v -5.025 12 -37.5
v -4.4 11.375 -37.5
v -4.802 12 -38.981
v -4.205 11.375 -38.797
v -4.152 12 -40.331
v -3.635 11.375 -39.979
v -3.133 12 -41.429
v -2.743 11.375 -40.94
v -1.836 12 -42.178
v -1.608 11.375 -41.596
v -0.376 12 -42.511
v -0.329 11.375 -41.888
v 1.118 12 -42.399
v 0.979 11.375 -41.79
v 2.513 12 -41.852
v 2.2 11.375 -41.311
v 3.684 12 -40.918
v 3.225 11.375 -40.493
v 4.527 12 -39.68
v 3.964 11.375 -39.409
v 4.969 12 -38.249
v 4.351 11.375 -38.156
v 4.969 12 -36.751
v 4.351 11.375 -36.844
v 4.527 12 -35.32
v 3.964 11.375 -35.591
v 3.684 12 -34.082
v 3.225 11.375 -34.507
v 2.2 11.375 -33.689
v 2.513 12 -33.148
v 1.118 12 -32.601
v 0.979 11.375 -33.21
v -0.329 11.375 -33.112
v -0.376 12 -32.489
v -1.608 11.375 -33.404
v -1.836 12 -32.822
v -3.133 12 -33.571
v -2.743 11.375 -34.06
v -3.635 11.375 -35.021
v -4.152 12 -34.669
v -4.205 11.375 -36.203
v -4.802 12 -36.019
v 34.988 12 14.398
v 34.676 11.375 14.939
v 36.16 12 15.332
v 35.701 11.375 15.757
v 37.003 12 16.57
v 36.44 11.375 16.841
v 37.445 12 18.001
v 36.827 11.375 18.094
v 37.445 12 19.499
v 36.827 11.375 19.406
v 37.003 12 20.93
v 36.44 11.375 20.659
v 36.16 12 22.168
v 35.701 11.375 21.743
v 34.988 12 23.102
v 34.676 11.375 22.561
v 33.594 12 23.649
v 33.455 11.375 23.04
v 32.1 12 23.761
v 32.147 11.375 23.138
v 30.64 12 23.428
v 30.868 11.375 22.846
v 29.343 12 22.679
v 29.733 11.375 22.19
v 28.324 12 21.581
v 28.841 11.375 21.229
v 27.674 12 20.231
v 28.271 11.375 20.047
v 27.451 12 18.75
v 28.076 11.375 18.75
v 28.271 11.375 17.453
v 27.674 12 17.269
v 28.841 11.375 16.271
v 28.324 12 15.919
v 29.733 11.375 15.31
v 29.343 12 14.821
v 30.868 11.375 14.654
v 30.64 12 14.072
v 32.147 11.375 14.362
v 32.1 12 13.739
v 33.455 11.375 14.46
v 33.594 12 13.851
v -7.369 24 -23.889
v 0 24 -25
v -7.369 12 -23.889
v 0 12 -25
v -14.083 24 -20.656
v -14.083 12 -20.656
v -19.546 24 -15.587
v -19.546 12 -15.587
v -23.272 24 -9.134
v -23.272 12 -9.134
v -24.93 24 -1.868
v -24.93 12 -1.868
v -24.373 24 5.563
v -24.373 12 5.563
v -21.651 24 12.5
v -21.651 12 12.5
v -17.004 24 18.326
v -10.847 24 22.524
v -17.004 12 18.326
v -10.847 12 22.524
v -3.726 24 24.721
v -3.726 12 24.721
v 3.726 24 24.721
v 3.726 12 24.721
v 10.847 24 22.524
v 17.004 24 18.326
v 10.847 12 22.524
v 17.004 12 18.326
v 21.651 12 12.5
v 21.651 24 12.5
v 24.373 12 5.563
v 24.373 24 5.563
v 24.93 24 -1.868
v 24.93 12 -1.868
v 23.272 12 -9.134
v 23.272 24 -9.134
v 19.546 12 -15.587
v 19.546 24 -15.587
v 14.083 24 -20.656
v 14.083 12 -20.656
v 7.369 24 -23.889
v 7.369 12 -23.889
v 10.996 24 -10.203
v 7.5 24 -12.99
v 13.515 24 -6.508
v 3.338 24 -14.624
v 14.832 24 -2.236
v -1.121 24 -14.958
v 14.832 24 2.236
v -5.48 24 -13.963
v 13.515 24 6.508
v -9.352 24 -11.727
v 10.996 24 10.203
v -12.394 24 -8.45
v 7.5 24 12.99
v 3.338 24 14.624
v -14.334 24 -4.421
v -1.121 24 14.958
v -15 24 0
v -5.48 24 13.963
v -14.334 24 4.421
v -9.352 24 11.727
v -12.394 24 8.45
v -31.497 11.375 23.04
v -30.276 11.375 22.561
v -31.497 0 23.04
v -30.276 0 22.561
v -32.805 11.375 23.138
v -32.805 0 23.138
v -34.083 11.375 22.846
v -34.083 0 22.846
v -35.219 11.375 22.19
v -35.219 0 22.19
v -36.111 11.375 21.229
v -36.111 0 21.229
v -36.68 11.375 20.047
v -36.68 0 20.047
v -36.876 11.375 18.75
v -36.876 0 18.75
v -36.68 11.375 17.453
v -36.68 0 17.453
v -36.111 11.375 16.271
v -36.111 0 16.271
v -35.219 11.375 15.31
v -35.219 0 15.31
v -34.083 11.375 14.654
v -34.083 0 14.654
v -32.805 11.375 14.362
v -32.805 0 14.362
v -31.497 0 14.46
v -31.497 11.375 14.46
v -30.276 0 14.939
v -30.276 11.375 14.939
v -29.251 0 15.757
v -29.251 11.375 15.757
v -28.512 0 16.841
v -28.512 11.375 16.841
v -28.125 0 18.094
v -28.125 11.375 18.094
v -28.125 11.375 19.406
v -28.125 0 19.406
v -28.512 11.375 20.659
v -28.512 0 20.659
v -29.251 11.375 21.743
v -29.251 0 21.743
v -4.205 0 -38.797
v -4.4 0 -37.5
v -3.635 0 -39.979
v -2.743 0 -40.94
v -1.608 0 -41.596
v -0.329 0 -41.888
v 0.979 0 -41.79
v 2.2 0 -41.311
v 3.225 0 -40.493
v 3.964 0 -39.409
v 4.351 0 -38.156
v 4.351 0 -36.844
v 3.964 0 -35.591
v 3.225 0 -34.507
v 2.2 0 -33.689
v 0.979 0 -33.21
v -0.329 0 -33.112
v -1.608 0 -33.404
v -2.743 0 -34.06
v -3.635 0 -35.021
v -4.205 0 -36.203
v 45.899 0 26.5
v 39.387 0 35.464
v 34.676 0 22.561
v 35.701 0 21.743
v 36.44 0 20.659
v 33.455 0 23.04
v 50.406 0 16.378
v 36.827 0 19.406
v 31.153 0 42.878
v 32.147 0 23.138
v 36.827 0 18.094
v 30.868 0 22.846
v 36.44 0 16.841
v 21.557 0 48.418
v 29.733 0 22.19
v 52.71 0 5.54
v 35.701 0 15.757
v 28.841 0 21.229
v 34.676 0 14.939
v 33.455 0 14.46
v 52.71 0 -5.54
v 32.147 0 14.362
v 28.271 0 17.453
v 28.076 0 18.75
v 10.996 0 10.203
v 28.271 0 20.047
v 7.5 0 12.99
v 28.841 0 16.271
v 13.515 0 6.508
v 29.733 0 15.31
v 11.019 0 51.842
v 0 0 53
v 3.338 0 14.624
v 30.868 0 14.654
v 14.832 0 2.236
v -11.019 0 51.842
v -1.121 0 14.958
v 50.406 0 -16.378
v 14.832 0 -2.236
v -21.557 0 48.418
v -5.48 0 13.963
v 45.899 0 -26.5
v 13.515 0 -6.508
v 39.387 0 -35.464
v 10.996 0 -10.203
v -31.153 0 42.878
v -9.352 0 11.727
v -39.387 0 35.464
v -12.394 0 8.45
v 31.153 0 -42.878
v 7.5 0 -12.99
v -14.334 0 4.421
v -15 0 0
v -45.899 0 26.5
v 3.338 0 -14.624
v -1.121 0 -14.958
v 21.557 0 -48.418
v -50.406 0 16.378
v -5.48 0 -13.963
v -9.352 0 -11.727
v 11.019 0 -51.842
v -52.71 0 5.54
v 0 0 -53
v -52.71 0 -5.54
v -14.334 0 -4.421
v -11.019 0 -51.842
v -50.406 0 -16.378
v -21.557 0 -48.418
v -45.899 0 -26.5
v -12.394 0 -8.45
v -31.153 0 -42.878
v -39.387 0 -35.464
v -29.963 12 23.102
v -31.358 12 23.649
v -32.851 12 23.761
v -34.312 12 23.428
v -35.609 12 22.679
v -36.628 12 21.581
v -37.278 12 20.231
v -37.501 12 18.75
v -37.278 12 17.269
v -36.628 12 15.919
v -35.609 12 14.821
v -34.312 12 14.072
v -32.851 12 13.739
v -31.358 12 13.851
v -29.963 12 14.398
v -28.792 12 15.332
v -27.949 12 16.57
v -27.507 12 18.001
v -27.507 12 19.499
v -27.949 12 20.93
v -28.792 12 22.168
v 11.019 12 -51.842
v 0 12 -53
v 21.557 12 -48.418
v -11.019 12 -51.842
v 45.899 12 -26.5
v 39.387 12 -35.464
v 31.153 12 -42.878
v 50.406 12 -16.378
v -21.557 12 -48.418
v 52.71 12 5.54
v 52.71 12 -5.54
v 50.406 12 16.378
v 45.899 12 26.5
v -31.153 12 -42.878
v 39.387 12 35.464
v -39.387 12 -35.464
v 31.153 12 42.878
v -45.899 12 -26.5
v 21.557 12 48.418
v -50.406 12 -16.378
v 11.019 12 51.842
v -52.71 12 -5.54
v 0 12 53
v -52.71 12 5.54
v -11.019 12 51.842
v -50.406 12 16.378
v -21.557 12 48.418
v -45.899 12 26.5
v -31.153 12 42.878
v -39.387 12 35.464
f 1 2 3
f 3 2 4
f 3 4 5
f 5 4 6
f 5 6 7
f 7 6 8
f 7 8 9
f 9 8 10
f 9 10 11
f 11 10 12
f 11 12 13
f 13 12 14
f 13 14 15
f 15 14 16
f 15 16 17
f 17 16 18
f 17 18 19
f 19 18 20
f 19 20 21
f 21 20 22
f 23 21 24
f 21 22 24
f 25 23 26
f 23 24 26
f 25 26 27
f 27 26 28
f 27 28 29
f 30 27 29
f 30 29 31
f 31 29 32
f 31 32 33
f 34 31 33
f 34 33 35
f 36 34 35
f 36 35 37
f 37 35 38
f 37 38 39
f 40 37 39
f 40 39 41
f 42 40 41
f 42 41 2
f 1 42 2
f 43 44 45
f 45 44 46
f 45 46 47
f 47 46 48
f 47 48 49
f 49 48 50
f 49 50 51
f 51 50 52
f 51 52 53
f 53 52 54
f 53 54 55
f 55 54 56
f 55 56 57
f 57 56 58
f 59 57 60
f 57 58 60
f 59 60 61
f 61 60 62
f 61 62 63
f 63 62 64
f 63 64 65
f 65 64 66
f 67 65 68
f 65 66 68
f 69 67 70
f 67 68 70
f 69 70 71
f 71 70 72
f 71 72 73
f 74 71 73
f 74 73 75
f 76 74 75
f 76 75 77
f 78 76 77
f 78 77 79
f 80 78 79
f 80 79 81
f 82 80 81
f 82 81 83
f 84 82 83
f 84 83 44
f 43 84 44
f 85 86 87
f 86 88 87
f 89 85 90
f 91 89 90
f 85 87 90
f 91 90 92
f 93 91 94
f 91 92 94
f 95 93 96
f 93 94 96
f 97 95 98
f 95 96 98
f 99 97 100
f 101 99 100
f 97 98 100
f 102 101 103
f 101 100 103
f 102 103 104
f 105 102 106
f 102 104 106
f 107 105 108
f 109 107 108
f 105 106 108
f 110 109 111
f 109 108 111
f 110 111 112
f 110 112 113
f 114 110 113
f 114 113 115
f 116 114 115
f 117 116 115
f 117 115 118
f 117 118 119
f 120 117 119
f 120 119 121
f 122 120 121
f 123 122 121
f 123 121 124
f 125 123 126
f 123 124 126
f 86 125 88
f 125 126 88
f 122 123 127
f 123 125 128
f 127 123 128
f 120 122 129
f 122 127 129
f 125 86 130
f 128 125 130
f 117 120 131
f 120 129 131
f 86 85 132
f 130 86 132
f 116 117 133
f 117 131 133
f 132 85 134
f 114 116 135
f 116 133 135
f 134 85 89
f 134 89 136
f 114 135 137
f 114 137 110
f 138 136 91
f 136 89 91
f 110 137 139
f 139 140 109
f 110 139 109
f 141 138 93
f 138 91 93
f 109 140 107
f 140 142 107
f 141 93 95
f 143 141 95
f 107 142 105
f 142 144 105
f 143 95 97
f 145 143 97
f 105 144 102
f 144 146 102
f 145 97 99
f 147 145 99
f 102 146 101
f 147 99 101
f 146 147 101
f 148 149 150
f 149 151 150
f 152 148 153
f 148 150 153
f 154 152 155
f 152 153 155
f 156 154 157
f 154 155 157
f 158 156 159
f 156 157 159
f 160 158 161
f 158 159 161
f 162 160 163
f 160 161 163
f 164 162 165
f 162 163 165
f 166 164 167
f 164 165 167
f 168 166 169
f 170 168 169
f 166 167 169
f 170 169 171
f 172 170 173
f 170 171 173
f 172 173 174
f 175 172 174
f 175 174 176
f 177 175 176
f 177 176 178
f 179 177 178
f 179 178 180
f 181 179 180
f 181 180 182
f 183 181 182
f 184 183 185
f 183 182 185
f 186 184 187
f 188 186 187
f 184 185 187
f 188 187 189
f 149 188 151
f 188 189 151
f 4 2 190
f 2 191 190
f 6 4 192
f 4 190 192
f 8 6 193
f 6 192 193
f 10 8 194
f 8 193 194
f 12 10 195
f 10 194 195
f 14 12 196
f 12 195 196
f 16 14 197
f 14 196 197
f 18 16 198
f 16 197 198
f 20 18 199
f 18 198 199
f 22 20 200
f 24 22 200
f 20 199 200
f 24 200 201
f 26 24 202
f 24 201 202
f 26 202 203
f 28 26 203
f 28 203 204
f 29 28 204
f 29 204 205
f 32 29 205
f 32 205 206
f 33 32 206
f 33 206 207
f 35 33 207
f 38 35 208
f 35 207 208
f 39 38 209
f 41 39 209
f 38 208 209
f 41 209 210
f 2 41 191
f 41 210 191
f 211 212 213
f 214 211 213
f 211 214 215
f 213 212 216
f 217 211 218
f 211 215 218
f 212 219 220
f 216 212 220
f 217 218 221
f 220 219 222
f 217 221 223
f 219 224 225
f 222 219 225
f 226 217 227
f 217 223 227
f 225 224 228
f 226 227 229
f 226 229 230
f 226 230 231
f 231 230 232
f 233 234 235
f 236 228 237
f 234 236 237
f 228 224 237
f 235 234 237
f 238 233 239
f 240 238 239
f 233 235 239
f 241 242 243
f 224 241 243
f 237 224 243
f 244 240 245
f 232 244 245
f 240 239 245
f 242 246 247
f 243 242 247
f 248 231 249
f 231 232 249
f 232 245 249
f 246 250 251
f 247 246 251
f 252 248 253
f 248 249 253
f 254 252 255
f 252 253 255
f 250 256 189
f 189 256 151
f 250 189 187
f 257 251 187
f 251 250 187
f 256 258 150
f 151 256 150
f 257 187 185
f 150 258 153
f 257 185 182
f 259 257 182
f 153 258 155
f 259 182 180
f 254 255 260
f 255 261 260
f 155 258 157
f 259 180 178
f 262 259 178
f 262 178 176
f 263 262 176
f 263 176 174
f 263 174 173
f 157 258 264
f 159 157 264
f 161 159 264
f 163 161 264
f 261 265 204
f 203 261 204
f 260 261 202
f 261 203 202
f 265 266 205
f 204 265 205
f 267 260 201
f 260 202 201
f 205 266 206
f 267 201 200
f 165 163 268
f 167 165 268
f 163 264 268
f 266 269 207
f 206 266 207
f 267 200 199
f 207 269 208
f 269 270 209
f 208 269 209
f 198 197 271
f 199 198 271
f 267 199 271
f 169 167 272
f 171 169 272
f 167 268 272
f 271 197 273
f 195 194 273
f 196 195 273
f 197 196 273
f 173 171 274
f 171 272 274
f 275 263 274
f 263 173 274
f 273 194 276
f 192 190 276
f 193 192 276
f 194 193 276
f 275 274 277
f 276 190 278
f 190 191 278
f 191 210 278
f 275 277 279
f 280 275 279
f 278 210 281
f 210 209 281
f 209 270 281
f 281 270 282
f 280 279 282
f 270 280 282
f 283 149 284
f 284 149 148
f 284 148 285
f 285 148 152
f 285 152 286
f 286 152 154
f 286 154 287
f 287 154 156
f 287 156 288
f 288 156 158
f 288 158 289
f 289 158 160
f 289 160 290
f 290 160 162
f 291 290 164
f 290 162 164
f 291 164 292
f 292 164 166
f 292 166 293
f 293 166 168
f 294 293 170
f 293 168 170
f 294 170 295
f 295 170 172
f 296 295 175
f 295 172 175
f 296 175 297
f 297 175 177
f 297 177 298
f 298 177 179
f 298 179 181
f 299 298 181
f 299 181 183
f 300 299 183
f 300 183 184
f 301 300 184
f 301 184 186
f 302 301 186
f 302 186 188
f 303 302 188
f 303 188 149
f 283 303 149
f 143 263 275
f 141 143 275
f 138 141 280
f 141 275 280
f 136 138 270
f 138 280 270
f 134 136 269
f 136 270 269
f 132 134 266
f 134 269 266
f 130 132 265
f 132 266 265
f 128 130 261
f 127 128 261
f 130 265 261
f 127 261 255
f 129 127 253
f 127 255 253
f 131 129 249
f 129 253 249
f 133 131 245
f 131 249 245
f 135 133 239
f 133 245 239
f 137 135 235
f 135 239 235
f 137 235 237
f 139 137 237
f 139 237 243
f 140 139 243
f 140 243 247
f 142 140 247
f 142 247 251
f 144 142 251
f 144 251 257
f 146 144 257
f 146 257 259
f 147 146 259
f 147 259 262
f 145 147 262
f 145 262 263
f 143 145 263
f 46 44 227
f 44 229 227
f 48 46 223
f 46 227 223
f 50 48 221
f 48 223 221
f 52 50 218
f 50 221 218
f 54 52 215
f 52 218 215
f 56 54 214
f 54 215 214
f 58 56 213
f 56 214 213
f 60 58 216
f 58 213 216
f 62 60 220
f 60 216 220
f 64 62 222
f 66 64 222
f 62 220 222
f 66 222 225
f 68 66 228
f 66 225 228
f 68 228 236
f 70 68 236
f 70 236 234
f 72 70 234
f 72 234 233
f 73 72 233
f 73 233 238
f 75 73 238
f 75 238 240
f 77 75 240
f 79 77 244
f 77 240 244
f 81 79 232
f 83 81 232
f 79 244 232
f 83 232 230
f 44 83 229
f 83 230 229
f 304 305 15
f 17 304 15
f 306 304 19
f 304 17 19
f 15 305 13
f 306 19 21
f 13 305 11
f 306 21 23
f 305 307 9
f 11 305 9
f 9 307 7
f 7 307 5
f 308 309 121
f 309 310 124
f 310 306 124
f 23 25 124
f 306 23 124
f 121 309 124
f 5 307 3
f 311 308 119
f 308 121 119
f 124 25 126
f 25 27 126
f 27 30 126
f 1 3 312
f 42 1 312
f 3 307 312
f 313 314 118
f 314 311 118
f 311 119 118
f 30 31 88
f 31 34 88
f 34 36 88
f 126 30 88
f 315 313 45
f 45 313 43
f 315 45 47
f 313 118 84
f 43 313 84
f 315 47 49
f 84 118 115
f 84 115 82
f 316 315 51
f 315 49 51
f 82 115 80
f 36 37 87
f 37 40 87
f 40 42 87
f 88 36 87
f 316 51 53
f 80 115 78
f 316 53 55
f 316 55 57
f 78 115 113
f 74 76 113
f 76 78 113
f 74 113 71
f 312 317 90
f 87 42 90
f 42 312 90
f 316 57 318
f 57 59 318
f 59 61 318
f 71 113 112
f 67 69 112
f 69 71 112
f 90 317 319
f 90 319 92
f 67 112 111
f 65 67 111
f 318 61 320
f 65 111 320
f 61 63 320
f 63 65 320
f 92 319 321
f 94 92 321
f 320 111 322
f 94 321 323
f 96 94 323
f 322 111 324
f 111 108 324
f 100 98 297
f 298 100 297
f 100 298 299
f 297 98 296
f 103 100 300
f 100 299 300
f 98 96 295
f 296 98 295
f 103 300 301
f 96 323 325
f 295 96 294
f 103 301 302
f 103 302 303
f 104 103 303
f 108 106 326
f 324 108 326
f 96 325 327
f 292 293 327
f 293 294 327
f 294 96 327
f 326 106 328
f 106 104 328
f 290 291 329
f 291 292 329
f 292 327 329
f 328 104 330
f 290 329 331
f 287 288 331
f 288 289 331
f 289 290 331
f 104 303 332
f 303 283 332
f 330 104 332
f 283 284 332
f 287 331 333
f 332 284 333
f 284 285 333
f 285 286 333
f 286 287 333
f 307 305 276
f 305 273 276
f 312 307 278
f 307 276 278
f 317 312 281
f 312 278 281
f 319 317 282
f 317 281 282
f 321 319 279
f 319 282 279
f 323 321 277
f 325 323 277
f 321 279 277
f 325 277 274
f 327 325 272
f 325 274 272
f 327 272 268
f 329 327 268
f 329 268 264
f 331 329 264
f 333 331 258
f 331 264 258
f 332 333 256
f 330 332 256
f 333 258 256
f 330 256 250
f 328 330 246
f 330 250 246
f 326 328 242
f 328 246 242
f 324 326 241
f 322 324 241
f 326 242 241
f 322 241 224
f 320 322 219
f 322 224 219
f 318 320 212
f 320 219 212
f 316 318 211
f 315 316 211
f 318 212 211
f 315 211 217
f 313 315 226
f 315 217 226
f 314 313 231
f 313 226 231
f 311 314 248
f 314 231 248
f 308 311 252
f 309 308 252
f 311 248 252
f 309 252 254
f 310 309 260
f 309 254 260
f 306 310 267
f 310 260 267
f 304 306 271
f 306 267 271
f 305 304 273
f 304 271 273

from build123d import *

# Parameters (mm, degrees)
HOLE1_D                           = 30
M10X1_25_TAPPED_HOLE1_D           = 8.8
M10X1_25_TAPPED_HOLE1_CSINK_D     = 10.05
M10X1_25_TAPPED_HOLE1_CSINK_ANGLE = 90
CIRPATTERN1_COUNT                 = 3


with BuildPart() as part:
    # Sketch1 → Revolve1 (revolve)
    with BuildSketch(Plane(origin=(0, 0, 0), x_dir=(0, 0, -1), z_dir=(1, 0, 0))):
        Polygon((0, 0), (0, 24), (25, 24), (25, 12), (53, 12), (53, 0), align=None)
    revolve(axis=Axis((0, 0, 0), (0, 1, 0)))

    # Hole1 (through all)
    with Locations(Plane(origin=(0, 24, 0), x_dir=(1, 0, 0), z_dir=(0, 1, 0))):
        with Locations((0, 0)):
            Hole(HOLE1_D / 2)

    # M10x1.25 Tapped Hole1 (through all)
    with Locations(Plane(origin=(0, 12, 0), x_dir=(1, 0, 0), z_dir=(0, 1, 0))):
        with Locations((0, 37.5)):
            m10x1_25_tapped_hole1 = CounterSinkHole(M10X1_25_TAPPED_HOLE1_D / 2, M10X1_25_TAPPED_HOLE1_CSINK_D / 2, counter_sink_angle=M10X1_25_TAPPED_HOLE1_CSINK_ANGLE)

    # CirPattern1: M10x1.25 Tapped Hole1 ×3 about axis
    cirpattern1_axis = Axis((0, 0, 0), (0, 1, 0))
    for i in range(1, CIRPATTERN1_COUNT):
        add(m10x1_25_tapped_hole1.rotate(cirpattern1_axis, i * 360 / CIRPATTERN1_COUNT), mode=Mode.SUBTRACT)


solid = part.part
